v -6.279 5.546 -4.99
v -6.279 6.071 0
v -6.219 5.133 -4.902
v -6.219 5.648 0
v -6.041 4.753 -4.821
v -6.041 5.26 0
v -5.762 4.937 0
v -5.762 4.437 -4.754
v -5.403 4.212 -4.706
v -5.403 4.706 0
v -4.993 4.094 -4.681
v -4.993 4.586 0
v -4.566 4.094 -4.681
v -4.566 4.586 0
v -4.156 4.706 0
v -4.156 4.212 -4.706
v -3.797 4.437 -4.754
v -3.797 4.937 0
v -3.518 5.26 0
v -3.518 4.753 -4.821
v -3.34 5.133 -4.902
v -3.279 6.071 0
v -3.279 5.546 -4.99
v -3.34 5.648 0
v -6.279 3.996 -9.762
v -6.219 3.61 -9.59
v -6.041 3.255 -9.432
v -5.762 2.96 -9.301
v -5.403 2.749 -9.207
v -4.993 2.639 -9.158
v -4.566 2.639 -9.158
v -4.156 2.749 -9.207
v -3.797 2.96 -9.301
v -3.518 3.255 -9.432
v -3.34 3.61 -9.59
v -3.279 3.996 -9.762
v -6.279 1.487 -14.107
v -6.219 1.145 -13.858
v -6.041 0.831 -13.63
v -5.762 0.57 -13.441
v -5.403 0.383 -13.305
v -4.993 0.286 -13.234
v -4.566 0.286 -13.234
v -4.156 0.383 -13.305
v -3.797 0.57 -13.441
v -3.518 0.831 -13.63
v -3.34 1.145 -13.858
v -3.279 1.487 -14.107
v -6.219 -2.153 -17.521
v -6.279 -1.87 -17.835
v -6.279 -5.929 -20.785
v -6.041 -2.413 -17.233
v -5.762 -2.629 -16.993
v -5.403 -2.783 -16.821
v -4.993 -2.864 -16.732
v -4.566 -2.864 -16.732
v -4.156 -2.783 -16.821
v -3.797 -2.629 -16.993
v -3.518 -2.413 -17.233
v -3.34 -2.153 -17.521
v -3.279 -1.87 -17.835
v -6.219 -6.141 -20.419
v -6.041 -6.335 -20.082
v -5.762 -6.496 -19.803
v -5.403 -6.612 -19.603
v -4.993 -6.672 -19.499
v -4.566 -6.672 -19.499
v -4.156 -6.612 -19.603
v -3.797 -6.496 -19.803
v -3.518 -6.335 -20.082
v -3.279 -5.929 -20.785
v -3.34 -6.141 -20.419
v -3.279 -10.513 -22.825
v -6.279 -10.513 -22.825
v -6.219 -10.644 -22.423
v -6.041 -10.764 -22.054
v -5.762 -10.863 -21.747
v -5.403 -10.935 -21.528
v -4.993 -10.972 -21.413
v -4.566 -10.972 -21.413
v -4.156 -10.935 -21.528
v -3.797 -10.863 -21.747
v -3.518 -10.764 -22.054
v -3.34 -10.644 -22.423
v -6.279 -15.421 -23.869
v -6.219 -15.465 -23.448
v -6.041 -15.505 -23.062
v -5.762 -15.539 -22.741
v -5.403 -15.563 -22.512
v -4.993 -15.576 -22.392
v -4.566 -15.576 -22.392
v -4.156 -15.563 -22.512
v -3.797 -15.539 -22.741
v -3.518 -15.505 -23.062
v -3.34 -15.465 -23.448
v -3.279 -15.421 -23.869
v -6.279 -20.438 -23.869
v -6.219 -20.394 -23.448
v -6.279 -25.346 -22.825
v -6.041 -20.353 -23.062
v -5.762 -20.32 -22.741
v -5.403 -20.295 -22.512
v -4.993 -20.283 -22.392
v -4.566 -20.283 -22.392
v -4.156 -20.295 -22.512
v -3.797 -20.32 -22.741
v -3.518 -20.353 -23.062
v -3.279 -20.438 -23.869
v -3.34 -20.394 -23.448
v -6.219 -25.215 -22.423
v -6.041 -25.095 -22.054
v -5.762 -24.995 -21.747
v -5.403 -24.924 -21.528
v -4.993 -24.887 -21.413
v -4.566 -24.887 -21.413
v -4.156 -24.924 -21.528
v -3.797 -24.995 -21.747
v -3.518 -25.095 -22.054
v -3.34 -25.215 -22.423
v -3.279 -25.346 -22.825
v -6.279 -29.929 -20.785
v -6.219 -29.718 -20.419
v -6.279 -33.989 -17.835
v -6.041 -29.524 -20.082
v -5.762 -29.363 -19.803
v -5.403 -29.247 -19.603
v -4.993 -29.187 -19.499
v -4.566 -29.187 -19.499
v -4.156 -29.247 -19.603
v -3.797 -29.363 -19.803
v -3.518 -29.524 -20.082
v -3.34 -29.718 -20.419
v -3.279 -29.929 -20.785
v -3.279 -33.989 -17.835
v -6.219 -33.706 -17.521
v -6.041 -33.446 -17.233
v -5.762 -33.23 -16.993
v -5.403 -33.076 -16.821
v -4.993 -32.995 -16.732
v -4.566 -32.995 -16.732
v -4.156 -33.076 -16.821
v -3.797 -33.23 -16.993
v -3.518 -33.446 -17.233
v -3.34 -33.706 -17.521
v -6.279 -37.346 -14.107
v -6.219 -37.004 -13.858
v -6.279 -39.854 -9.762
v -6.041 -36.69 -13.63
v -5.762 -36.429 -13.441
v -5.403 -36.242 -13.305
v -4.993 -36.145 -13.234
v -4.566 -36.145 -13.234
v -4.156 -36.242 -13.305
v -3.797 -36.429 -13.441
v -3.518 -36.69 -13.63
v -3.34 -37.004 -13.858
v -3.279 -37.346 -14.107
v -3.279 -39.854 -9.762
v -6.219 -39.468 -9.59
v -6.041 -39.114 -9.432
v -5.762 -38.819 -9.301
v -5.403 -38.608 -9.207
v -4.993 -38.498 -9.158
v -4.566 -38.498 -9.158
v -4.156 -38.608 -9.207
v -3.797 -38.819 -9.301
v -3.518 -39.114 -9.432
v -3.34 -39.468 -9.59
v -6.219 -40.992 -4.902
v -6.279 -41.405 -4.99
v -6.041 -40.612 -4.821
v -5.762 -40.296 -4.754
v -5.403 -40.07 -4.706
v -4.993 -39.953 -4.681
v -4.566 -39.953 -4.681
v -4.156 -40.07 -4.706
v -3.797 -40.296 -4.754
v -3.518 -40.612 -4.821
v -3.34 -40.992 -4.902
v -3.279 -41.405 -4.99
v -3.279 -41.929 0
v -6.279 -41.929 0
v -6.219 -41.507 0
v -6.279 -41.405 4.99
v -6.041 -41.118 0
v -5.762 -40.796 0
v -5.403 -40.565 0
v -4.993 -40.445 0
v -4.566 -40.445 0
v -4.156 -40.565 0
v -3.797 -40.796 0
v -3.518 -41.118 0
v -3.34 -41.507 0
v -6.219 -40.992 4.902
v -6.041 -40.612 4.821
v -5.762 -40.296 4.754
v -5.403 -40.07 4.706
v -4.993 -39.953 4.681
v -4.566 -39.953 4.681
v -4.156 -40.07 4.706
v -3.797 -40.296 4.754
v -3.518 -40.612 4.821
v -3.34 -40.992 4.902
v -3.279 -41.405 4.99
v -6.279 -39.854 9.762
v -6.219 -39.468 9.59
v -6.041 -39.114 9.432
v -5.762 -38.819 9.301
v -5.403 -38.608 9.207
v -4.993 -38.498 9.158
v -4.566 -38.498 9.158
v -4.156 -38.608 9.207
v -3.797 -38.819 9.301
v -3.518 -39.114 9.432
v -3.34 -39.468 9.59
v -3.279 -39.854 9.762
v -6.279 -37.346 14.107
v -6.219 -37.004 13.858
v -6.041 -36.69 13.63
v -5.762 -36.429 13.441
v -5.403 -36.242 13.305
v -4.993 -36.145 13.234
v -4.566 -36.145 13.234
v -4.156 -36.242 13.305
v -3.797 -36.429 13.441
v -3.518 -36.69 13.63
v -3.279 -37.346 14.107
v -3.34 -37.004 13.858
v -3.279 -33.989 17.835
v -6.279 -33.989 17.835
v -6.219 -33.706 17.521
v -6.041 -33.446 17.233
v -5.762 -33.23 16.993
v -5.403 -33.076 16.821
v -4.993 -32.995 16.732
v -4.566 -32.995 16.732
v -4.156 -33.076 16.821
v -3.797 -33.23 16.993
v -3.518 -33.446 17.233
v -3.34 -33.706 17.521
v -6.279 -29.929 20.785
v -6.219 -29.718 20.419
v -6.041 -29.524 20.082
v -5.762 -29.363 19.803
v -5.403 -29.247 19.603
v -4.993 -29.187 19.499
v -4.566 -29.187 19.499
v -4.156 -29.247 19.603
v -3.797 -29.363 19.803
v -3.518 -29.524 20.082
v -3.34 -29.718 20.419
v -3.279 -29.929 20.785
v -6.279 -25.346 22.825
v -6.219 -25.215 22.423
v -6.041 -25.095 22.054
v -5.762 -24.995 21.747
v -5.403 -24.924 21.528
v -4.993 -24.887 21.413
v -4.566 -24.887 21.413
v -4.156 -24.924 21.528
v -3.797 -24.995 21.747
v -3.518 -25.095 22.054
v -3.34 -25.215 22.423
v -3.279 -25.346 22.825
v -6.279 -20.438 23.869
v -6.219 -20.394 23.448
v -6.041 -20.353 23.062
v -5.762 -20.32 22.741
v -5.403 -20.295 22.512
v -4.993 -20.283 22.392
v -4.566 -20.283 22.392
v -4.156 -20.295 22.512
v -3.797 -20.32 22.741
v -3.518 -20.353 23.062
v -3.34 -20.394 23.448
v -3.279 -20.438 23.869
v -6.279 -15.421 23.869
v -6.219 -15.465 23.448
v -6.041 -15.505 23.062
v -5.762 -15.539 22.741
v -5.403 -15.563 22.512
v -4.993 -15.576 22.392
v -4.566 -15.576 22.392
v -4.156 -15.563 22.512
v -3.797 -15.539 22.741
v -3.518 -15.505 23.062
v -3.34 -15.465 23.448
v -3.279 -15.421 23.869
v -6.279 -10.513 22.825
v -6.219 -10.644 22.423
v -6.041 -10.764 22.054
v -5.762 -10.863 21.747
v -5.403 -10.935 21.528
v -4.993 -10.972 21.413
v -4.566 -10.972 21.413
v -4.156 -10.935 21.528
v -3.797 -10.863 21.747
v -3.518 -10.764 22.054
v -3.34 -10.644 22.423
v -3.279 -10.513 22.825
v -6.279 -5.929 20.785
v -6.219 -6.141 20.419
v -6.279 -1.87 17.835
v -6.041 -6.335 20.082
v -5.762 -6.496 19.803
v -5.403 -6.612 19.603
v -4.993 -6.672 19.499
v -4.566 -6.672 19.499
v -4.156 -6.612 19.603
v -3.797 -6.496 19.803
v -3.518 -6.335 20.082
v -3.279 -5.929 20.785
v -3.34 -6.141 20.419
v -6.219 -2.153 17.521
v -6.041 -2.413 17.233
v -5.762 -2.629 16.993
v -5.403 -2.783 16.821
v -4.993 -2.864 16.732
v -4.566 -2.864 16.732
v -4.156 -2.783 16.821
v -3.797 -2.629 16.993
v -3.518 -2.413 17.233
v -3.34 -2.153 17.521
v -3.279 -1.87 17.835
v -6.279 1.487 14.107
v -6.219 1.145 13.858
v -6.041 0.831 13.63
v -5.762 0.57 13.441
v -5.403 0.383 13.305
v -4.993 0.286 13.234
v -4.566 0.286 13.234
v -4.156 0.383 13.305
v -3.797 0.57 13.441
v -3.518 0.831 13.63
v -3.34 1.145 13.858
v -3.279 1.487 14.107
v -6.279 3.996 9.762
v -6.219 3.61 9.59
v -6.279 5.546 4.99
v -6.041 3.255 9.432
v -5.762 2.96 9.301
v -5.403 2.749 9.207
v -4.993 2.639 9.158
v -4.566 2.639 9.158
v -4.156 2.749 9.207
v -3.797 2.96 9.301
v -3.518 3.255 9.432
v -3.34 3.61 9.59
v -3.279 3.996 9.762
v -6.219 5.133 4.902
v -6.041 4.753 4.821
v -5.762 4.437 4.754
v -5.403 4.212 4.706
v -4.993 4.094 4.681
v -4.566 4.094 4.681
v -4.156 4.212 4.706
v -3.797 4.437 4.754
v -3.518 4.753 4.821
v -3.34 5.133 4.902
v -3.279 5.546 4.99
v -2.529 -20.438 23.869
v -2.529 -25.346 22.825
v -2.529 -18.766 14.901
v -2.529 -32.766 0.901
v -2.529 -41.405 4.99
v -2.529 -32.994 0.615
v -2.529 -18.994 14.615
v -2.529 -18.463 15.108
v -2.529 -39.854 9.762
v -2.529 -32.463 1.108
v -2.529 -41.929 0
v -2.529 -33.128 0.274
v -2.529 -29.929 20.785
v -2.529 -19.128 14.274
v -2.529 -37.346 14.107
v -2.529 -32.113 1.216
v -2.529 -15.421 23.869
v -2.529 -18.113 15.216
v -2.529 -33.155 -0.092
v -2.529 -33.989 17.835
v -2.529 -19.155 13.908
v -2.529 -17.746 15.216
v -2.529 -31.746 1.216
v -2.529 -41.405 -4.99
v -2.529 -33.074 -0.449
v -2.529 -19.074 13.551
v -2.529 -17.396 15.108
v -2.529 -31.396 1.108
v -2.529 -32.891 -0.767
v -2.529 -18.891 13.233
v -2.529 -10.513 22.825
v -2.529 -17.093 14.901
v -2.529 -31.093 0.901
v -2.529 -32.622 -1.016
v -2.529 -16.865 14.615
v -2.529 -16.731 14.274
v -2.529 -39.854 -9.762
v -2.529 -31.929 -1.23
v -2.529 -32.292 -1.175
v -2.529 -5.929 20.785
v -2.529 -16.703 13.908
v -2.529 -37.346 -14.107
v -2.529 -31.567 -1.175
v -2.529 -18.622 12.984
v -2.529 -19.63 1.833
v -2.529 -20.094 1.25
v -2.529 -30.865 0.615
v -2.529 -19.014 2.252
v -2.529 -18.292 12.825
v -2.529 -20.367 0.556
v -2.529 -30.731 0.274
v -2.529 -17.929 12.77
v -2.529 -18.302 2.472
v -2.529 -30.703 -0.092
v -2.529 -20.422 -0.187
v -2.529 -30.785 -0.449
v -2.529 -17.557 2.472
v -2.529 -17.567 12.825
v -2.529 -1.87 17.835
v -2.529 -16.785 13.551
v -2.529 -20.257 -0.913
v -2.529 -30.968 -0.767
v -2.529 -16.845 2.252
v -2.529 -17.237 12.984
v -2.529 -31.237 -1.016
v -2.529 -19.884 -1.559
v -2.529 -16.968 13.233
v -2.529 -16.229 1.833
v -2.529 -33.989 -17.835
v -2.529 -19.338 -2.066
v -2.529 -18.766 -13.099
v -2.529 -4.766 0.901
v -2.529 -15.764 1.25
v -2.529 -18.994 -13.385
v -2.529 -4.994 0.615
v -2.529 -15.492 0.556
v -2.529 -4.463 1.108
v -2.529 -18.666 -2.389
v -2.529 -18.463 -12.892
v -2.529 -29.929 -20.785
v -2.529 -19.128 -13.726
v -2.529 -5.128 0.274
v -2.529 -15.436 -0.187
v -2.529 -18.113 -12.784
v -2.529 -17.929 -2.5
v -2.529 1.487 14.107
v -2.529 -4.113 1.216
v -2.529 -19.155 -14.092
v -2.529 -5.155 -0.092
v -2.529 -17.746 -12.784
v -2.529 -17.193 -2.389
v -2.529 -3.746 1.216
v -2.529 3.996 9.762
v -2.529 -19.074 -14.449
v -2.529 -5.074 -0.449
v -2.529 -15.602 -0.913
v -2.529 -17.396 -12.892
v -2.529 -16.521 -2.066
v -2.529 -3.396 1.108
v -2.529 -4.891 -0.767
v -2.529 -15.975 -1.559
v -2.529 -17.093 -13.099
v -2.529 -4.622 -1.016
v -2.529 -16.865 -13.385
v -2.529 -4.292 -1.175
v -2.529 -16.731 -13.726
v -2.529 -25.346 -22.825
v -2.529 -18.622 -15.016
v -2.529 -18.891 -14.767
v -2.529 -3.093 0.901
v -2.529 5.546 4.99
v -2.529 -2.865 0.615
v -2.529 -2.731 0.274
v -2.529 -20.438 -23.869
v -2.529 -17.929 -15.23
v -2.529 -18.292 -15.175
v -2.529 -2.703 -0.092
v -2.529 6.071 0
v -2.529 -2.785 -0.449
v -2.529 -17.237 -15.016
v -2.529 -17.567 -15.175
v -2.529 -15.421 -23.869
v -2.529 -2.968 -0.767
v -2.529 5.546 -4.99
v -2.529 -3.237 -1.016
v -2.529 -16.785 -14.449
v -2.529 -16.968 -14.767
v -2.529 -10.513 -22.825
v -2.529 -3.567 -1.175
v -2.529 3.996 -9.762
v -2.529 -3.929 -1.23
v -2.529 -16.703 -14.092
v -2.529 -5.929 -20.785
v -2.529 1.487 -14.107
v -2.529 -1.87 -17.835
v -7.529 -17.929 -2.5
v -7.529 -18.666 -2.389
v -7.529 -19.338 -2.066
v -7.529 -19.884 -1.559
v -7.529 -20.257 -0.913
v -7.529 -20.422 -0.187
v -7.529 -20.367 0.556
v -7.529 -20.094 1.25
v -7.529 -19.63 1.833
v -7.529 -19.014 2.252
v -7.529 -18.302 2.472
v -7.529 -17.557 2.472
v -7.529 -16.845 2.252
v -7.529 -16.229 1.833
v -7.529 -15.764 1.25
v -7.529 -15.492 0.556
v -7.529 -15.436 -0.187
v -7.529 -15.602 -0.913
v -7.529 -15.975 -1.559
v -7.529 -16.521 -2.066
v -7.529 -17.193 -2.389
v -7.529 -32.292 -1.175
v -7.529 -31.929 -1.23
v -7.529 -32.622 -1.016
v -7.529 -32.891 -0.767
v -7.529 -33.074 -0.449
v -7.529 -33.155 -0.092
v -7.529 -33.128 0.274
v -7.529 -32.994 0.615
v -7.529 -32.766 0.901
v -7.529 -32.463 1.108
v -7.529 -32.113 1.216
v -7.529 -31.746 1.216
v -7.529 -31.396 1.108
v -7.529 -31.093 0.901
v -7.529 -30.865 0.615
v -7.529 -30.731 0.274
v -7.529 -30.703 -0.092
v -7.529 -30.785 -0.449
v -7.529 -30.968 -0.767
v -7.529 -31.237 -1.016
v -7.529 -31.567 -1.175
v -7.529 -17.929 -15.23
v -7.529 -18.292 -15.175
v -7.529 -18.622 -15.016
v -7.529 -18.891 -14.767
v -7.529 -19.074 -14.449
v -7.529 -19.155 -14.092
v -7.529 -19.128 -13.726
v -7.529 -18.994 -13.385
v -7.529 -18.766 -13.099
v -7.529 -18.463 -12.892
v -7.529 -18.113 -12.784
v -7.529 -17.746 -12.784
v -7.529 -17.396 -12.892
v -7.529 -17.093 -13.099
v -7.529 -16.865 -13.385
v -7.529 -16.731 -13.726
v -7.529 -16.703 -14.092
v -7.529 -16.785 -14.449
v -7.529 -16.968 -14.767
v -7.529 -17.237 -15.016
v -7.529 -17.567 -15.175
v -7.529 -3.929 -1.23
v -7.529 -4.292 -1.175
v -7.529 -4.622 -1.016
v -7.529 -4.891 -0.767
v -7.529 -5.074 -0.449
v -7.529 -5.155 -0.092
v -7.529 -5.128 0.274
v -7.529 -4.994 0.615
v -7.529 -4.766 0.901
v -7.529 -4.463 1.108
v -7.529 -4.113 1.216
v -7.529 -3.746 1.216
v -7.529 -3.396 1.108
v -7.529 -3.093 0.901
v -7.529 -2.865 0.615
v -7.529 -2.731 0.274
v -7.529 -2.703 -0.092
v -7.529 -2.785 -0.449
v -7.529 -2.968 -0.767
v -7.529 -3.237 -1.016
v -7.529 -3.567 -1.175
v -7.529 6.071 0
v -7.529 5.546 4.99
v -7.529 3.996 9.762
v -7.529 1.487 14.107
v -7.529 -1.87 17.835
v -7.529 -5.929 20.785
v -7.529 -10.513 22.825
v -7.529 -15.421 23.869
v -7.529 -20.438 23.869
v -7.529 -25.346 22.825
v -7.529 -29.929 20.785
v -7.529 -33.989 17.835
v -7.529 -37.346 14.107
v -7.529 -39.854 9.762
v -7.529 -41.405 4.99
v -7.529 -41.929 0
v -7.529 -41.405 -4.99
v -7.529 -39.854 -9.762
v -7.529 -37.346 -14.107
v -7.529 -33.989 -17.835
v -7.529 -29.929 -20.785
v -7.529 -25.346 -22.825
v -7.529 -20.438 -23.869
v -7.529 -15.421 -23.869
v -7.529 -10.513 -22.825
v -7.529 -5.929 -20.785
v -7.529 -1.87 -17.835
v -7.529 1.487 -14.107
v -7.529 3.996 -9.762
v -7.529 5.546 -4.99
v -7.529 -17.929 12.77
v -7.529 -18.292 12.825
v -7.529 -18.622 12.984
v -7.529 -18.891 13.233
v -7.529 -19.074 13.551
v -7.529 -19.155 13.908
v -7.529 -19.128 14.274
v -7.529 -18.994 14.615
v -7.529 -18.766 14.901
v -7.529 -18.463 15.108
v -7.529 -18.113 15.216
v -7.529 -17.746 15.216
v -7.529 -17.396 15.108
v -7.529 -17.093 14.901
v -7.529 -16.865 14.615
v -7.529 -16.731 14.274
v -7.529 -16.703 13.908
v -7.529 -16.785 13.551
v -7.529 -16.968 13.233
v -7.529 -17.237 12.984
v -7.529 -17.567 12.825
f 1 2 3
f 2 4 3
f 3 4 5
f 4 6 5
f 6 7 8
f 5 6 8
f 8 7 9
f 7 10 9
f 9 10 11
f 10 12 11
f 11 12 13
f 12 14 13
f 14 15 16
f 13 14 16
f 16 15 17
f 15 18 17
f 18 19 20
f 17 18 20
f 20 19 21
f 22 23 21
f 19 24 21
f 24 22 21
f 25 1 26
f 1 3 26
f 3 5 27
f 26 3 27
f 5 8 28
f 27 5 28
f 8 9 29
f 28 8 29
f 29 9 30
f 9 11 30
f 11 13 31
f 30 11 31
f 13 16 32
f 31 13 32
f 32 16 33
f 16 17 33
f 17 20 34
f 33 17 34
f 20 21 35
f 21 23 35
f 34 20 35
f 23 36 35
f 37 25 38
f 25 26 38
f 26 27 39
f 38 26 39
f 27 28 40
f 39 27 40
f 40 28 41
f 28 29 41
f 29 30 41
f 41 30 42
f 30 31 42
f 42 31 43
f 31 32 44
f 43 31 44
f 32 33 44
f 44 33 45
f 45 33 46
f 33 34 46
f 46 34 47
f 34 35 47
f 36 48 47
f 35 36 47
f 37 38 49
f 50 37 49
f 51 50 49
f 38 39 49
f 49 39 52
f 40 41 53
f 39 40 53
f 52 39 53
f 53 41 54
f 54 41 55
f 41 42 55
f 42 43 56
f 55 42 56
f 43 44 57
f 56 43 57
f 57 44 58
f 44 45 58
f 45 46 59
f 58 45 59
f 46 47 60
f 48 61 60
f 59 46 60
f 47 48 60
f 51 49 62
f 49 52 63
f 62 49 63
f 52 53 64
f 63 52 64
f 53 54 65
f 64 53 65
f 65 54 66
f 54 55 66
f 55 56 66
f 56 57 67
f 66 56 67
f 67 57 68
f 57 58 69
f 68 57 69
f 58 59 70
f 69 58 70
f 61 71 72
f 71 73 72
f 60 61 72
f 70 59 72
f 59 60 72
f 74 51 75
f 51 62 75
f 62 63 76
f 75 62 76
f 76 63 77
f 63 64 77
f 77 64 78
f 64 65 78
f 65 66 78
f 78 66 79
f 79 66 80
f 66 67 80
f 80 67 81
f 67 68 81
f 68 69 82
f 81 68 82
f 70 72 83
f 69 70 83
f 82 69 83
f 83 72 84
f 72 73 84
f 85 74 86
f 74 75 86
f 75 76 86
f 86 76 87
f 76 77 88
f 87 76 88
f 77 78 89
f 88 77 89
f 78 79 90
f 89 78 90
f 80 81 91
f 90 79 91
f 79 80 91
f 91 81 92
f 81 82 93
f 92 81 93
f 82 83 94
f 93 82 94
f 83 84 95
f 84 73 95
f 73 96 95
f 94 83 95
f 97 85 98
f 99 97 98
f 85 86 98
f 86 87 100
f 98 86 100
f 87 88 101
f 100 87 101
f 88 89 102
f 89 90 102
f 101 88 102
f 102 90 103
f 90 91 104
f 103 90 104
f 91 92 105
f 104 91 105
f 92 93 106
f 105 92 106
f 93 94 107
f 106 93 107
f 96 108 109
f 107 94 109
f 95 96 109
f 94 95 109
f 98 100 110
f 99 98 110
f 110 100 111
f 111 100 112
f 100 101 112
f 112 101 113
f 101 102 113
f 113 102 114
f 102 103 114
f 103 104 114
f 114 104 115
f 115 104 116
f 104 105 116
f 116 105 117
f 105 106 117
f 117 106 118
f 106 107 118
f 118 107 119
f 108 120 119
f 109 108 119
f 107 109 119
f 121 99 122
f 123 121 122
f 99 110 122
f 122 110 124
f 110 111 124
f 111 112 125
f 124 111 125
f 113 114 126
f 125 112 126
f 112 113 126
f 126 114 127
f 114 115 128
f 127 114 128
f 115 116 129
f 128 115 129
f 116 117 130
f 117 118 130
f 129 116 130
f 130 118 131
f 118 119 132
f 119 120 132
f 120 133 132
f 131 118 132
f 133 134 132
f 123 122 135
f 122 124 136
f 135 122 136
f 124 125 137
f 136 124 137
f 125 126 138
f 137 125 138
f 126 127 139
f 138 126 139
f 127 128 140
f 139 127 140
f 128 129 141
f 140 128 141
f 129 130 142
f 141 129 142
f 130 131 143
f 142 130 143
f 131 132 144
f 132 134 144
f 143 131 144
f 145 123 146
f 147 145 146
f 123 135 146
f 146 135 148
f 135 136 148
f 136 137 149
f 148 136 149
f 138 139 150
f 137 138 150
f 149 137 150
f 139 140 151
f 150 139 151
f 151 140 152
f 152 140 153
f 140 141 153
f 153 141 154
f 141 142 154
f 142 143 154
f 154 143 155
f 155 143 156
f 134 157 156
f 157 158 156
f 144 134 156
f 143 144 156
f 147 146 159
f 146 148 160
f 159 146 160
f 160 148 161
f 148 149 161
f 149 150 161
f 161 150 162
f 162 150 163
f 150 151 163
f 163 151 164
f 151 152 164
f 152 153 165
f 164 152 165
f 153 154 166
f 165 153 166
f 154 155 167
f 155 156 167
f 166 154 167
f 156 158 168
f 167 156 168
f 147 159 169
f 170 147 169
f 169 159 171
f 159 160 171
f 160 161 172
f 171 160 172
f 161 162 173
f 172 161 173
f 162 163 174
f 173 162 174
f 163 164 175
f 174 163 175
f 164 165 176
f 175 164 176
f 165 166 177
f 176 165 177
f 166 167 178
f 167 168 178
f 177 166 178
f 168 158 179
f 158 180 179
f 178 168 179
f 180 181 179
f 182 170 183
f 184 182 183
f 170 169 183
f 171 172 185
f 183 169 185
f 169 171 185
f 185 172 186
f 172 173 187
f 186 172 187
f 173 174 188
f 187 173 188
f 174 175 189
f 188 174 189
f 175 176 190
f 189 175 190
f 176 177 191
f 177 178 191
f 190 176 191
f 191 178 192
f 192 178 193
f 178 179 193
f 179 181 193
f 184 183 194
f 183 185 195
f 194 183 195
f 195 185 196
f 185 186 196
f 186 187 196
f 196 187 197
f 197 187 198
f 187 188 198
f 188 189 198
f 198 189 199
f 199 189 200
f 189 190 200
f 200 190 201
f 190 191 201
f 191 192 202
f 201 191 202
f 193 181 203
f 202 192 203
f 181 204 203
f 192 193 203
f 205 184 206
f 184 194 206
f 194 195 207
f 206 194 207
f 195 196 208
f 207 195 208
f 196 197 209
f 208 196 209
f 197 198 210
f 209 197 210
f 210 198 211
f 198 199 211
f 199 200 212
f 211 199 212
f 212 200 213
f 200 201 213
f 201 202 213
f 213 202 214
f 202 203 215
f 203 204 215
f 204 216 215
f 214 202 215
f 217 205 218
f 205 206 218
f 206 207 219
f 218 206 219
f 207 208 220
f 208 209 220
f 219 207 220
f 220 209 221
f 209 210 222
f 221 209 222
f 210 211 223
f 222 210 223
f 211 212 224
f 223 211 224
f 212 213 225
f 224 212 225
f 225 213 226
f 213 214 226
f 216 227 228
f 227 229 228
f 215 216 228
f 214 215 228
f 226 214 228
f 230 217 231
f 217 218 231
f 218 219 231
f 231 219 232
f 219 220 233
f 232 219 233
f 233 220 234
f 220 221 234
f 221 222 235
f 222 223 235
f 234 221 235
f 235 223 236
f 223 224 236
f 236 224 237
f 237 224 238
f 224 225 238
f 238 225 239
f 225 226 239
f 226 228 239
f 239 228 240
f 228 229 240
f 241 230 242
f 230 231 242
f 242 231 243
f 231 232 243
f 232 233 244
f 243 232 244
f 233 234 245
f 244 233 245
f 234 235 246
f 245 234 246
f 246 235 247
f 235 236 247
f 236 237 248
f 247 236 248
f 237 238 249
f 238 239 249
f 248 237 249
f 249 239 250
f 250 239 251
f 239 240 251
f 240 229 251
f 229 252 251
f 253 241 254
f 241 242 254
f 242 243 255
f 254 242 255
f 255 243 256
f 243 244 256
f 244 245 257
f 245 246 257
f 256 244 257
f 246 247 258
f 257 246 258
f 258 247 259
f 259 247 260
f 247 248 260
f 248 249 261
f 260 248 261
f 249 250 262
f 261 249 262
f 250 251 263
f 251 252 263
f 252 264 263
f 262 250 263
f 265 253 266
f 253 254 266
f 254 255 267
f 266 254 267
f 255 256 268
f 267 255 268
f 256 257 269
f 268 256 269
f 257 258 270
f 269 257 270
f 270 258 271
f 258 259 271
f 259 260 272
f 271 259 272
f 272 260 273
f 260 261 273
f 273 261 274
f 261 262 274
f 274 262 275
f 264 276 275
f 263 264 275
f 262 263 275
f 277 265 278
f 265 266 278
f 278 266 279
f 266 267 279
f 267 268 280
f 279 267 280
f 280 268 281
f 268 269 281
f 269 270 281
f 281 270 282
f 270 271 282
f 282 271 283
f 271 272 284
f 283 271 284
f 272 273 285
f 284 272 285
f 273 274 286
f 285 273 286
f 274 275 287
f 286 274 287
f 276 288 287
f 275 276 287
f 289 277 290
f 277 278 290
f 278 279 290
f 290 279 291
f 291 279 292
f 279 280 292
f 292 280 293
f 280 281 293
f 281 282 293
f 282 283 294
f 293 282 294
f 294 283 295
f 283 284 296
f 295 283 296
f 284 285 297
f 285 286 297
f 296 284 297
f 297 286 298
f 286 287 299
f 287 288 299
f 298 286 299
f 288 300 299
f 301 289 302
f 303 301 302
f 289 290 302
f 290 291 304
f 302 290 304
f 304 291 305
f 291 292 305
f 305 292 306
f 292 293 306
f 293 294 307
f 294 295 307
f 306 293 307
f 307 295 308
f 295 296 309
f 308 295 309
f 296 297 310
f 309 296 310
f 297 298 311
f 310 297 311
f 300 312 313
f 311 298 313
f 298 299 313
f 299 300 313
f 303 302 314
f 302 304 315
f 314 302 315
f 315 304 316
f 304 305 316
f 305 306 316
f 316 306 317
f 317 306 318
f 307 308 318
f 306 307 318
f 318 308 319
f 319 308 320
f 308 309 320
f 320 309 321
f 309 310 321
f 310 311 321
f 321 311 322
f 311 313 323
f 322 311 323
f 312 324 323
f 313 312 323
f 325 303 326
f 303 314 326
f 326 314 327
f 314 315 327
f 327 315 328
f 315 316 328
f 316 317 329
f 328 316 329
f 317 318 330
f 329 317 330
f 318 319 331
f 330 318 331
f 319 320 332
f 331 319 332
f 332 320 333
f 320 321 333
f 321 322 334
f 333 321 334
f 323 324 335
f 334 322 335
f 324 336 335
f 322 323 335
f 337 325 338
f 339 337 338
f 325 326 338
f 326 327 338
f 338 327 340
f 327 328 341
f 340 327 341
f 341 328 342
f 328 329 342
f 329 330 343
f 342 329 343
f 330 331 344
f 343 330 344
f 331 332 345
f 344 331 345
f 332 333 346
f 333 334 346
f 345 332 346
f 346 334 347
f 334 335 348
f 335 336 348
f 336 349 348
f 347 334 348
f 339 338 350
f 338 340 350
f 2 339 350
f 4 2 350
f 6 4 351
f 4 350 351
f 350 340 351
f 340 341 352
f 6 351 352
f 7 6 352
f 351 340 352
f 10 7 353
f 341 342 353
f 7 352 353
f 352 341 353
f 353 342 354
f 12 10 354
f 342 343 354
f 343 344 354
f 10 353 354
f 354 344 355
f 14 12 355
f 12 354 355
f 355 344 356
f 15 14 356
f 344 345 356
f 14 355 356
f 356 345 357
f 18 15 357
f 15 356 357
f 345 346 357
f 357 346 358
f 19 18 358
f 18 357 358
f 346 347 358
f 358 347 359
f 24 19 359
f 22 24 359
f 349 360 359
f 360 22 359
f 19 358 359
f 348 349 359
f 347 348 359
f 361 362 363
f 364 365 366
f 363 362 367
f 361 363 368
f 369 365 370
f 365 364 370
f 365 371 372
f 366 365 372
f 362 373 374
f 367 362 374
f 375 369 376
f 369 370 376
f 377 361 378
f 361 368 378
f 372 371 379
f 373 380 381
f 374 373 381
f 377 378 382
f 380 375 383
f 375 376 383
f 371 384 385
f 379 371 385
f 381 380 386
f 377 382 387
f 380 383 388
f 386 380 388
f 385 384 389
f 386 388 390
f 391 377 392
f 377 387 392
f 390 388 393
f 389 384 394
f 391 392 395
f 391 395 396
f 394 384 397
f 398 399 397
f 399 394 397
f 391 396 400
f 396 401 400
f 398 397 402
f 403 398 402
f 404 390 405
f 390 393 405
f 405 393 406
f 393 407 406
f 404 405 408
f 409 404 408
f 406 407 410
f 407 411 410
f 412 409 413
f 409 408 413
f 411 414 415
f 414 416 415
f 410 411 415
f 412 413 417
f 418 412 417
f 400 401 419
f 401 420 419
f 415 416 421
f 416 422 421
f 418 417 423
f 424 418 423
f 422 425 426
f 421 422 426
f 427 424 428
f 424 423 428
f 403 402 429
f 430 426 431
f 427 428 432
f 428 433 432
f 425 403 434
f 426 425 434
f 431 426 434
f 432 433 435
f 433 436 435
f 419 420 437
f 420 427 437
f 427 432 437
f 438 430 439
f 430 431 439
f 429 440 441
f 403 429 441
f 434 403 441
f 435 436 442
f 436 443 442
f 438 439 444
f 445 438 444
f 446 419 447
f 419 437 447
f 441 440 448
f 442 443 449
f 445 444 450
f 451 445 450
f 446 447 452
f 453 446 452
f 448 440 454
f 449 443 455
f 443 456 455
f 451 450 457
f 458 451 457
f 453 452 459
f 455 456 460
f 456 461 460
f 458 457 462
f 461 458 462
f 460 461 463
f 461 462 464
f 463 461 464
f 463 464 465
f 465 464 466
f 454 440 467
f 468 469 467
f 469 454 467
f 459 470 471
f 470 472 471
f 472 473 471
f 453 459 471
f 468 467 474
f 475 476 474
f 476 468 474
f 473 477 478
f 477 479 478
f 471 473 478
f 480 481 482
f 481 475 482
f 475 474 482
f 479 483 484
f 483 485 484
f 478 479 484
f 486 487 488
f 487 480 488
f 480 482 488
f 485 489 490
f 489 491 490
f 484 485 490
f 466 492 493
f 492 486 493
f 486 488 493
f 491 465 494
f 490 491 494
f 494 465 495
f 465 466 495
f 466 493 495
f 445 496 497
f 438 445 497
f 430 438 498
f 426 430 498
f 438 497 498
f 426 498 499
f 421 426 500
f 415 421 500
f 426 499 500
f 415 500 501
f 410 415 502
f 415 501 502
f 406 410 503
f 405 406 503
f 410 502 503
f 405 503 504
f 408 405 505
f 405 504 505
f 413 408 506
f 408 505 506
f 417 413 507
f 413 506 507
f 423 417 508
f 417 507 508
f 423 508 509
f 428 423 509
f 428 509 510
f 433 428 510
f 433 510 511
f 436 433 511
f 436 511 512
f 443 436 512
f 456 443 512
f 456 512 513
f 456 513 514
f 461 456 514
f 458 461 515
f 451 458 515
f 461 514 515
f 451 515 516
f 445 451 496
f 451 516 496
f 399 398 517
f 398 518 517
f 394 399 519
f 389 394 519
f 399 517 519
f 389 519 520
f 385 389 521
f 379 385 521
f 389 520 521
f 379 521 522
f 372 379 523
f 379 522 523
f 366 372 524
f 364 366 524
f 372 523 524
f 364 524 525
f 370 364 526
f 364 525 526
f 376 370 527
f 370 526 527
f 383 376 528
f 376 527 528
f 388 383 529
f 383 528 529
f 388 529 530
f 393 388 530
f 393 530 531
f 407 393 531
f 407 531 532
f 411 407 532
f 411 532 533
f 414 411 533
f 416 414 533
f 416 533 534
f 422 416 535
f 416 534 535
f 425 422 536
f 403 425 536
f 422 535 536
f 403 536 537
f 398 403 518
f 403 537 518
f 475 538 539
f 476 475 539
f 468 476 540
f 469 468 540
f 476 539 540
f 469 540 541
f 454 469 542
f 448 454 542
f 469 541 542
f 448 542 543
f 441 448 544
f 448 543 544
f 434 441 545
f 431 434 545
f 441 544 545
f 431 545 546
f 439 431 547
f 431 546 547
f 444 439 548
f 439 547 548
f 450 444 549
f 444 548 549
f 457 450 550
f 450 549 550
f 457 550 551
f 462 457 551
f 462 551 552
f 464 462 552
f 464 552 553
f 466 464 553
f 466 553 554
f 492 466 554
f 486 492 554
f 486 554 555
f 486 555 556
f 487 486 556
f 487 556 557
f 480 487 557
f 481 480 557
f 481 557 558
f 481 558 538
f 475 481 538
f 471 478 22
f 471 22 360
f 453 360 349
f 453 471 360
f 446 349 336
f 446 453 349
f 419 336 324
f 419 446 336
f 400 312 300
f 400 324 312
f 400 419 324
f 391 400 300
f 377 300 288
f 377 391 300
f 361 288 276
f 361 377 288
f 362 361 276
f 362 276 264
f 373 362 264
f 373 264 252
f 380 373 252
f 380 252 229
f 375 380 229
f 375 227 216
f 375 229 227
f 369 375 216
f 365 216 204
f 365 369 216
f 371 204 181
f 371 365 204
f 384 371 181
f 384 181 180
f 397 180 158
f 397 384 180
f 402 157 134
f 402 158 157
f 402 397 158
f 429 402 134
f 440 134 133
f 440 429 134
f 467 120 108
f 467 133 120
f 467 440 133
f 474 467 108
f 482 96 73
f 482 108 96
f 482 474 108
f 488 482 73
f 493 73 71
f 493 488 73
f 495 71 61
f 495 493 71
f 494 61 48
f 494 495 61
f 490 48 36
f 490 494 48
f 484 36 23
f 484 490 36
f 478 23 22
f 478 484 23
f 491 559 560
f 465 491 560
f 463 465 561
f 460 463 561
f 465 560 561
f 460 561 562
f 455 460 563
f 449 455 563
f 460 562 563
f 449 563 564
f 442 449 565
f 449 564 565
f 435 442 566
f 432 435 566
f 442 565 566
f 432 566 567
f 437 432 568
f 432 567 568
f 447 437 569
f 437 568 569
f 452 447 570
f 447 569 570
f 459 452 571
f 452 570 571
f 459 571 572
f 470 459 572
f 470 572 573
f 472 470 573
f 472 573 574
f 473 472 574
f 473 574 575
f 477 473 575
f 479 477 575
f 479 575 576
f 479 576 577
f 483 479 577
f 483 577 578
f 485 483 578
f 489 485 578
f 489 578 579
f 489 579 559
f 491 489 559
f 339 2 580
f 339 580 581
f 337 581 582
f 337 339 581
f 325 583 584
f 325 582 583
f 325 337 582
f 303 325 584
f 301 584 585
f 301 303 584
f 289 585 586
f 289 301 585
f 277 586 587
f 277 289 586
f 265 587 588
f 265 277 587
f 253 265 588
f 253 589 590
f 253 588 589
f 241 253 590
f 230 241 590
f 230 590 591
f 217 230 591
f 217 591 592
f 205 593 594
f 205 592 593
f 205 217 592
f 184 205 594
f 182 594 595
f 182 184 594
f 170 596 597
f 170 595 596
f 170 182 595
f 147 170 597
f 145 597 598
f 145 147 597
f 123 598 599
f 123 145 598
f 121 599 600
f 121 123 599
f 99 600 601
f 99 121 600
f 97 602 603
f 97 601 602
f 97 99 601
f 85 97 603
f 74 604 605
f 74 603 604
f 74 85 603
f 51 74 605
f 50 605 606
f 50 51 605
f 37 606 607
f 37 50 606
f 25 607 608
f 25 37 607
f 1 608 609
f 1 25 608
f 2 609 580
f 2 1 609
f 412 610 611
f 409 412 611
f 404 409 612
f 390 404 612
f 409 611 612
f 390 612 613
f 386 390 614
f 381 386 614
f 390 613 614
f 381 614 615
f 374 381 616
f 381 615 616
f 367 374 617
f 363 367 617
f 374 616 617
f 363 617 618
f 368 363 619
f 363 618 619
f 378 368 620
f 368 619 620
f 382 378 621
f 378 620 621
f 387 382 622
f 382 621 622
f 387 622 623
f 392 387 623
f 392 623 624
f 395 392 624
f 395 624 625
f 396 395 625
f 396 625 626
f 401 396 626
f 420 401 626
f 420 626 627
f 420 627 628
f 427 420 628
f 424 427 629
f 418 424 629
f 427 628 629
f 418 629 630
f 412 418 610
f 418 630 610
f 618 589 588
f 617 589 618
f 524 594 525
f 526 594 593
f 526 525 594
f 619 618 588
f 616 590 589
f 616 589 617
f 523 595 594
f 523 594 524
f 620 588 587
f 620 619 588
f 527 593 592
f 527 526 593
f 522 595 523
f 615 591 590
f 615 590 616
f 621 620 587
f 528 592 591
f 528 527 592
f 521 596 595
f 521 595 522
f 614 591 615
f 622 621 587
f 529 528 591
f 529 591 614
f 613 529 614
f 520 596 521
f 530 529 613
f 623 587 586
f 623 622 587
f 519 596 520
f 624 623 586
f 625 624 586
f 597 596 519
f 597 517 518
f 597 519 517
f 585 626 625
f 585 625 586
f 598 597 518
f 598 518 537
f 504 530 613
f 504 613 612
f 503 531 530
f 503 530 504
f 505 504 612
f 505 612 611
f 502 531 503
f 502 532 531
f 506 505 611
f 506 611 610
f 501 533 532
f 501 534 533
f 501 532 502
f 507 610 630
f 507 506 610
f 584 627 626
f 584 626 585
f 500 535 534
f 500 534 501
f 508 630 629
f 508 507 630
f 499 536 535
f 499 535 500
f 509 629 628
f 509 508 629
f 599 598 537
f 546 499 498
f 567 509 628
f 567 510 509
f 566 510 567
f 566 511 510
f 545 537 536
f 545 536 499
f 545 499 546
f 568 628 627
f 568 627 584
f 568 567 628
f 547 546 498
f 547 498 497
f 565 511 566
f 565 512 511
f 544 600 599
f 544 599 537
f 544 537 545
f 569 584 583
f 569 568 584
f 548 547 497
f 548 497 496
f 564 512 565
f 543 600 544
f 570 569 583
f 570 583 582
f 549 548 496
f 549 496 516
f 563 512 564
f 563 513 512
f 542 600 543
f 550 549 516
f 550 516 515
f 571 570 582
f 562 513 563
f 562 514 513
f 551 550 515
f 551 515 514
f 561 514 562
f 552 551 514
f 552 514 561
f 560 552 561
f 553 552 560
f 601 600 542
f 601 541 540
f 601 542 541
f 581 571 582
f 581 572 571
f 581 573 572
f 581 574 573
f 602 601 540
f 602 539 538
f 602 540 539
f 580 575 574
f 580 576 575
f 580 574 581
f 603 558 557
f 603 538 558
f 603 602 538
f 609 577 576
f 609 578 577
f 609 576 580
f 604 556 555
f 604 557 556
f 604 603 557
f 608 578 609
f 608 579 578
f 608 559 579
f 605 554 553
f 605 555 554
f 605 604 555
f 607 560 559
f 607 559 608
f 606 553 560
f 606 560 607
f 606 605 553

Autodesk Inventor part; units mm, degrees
ref_plane "YZ Plane" through (0, 0, 0) normal (1, 0, 0) x (0, 1, 0)
ref_plane "XZ Plane" through (0, 0, 0) normal (0, 1, 0) x (-1, 0, 0)
ref_plane "XY Plane" through (0, 0, 0) normal (0, 0, 1) x (1, 0, 0)
sketch "スケッチ1" plane through (0, 0, 0) normal (0, 0, 1) x (1, 0, 0)
  line L0 (-2.5294, 6.0706) -> (-2.5294, -17.9294)
  line L1 (-2.5294, -17.9294) -> (-7.5294, -17.9294)
  line L2 (-7.5294, -17.9294) -> (-7.5294, 6.0706)
  arc A0 (-6.2794, 6.0706) -> (-3.2794, 6.0706) centre (-4.7794, 6.0706) ccw
  line L3 (-7.5294, 6.0706) -> (-6.2794, 6.0706)
  line L4 (-3.2794, 6.0706) -> (-2.5294, 6.0706)
  point P0 (0, 0)
  dimension "d0" = 5
  dimension "d3" = 3
revolve "回転1" add sketch "スケッチ1" angle 360 about axis through (-2.5294, -17.9294, 0) along (-1, 0, 0)
sketch "スケッチ2" plane through (-2.5294, -17.9294, 0) normal (1, 0, 0) x (0, 0, -1)
  circle A0 centre (0, 0) radius 24 projected
  circle A1 centre (0, 0) radius 14
  circle A2 centre (-14, 0) radius 1.5
  circle A3 centre (14, 0) radius 1.5
  circle A4 centre (0, -14) radius 1.5
  circle A5 centre (0, 14) radius 1.5
  point P0 (0, 17.9294)
  dimension "d5" = 28
  dimension "d7" = 3
  dimension "d8" = 3
  dimension "d9" = 3
  dimension "d10" = 3
hole "穴1" at (-2.5294, -3.9294, 0) at (-2.5294, -17.9294, 14) at (-2.5294, -31.9294, 0) at (-2.5294, -17.9294, -14) direction (-1, 0, 0) diameter 2.459 end through all thread size "M3x0.5" class "6H" standard "ANSI Metric M Profile"
sketch "スケッチ3" plane through (-2.5294, -17.9294, 0) normal (1, 0, 0) x (0, 0, -1)
  circle A0 centre (0, 0) radius 24 projected
  circle A1 centre (0, 0) radius 2.5
  point P0 (0, 17.9294)
  dimension "d18" = 5
hole "穴2" at (-2.5294, -17.9294, 0) direction (-1, 0, 0) diameter 5 end through all
properties part number "hoiiru" material "アルミニウム 6061-O"
